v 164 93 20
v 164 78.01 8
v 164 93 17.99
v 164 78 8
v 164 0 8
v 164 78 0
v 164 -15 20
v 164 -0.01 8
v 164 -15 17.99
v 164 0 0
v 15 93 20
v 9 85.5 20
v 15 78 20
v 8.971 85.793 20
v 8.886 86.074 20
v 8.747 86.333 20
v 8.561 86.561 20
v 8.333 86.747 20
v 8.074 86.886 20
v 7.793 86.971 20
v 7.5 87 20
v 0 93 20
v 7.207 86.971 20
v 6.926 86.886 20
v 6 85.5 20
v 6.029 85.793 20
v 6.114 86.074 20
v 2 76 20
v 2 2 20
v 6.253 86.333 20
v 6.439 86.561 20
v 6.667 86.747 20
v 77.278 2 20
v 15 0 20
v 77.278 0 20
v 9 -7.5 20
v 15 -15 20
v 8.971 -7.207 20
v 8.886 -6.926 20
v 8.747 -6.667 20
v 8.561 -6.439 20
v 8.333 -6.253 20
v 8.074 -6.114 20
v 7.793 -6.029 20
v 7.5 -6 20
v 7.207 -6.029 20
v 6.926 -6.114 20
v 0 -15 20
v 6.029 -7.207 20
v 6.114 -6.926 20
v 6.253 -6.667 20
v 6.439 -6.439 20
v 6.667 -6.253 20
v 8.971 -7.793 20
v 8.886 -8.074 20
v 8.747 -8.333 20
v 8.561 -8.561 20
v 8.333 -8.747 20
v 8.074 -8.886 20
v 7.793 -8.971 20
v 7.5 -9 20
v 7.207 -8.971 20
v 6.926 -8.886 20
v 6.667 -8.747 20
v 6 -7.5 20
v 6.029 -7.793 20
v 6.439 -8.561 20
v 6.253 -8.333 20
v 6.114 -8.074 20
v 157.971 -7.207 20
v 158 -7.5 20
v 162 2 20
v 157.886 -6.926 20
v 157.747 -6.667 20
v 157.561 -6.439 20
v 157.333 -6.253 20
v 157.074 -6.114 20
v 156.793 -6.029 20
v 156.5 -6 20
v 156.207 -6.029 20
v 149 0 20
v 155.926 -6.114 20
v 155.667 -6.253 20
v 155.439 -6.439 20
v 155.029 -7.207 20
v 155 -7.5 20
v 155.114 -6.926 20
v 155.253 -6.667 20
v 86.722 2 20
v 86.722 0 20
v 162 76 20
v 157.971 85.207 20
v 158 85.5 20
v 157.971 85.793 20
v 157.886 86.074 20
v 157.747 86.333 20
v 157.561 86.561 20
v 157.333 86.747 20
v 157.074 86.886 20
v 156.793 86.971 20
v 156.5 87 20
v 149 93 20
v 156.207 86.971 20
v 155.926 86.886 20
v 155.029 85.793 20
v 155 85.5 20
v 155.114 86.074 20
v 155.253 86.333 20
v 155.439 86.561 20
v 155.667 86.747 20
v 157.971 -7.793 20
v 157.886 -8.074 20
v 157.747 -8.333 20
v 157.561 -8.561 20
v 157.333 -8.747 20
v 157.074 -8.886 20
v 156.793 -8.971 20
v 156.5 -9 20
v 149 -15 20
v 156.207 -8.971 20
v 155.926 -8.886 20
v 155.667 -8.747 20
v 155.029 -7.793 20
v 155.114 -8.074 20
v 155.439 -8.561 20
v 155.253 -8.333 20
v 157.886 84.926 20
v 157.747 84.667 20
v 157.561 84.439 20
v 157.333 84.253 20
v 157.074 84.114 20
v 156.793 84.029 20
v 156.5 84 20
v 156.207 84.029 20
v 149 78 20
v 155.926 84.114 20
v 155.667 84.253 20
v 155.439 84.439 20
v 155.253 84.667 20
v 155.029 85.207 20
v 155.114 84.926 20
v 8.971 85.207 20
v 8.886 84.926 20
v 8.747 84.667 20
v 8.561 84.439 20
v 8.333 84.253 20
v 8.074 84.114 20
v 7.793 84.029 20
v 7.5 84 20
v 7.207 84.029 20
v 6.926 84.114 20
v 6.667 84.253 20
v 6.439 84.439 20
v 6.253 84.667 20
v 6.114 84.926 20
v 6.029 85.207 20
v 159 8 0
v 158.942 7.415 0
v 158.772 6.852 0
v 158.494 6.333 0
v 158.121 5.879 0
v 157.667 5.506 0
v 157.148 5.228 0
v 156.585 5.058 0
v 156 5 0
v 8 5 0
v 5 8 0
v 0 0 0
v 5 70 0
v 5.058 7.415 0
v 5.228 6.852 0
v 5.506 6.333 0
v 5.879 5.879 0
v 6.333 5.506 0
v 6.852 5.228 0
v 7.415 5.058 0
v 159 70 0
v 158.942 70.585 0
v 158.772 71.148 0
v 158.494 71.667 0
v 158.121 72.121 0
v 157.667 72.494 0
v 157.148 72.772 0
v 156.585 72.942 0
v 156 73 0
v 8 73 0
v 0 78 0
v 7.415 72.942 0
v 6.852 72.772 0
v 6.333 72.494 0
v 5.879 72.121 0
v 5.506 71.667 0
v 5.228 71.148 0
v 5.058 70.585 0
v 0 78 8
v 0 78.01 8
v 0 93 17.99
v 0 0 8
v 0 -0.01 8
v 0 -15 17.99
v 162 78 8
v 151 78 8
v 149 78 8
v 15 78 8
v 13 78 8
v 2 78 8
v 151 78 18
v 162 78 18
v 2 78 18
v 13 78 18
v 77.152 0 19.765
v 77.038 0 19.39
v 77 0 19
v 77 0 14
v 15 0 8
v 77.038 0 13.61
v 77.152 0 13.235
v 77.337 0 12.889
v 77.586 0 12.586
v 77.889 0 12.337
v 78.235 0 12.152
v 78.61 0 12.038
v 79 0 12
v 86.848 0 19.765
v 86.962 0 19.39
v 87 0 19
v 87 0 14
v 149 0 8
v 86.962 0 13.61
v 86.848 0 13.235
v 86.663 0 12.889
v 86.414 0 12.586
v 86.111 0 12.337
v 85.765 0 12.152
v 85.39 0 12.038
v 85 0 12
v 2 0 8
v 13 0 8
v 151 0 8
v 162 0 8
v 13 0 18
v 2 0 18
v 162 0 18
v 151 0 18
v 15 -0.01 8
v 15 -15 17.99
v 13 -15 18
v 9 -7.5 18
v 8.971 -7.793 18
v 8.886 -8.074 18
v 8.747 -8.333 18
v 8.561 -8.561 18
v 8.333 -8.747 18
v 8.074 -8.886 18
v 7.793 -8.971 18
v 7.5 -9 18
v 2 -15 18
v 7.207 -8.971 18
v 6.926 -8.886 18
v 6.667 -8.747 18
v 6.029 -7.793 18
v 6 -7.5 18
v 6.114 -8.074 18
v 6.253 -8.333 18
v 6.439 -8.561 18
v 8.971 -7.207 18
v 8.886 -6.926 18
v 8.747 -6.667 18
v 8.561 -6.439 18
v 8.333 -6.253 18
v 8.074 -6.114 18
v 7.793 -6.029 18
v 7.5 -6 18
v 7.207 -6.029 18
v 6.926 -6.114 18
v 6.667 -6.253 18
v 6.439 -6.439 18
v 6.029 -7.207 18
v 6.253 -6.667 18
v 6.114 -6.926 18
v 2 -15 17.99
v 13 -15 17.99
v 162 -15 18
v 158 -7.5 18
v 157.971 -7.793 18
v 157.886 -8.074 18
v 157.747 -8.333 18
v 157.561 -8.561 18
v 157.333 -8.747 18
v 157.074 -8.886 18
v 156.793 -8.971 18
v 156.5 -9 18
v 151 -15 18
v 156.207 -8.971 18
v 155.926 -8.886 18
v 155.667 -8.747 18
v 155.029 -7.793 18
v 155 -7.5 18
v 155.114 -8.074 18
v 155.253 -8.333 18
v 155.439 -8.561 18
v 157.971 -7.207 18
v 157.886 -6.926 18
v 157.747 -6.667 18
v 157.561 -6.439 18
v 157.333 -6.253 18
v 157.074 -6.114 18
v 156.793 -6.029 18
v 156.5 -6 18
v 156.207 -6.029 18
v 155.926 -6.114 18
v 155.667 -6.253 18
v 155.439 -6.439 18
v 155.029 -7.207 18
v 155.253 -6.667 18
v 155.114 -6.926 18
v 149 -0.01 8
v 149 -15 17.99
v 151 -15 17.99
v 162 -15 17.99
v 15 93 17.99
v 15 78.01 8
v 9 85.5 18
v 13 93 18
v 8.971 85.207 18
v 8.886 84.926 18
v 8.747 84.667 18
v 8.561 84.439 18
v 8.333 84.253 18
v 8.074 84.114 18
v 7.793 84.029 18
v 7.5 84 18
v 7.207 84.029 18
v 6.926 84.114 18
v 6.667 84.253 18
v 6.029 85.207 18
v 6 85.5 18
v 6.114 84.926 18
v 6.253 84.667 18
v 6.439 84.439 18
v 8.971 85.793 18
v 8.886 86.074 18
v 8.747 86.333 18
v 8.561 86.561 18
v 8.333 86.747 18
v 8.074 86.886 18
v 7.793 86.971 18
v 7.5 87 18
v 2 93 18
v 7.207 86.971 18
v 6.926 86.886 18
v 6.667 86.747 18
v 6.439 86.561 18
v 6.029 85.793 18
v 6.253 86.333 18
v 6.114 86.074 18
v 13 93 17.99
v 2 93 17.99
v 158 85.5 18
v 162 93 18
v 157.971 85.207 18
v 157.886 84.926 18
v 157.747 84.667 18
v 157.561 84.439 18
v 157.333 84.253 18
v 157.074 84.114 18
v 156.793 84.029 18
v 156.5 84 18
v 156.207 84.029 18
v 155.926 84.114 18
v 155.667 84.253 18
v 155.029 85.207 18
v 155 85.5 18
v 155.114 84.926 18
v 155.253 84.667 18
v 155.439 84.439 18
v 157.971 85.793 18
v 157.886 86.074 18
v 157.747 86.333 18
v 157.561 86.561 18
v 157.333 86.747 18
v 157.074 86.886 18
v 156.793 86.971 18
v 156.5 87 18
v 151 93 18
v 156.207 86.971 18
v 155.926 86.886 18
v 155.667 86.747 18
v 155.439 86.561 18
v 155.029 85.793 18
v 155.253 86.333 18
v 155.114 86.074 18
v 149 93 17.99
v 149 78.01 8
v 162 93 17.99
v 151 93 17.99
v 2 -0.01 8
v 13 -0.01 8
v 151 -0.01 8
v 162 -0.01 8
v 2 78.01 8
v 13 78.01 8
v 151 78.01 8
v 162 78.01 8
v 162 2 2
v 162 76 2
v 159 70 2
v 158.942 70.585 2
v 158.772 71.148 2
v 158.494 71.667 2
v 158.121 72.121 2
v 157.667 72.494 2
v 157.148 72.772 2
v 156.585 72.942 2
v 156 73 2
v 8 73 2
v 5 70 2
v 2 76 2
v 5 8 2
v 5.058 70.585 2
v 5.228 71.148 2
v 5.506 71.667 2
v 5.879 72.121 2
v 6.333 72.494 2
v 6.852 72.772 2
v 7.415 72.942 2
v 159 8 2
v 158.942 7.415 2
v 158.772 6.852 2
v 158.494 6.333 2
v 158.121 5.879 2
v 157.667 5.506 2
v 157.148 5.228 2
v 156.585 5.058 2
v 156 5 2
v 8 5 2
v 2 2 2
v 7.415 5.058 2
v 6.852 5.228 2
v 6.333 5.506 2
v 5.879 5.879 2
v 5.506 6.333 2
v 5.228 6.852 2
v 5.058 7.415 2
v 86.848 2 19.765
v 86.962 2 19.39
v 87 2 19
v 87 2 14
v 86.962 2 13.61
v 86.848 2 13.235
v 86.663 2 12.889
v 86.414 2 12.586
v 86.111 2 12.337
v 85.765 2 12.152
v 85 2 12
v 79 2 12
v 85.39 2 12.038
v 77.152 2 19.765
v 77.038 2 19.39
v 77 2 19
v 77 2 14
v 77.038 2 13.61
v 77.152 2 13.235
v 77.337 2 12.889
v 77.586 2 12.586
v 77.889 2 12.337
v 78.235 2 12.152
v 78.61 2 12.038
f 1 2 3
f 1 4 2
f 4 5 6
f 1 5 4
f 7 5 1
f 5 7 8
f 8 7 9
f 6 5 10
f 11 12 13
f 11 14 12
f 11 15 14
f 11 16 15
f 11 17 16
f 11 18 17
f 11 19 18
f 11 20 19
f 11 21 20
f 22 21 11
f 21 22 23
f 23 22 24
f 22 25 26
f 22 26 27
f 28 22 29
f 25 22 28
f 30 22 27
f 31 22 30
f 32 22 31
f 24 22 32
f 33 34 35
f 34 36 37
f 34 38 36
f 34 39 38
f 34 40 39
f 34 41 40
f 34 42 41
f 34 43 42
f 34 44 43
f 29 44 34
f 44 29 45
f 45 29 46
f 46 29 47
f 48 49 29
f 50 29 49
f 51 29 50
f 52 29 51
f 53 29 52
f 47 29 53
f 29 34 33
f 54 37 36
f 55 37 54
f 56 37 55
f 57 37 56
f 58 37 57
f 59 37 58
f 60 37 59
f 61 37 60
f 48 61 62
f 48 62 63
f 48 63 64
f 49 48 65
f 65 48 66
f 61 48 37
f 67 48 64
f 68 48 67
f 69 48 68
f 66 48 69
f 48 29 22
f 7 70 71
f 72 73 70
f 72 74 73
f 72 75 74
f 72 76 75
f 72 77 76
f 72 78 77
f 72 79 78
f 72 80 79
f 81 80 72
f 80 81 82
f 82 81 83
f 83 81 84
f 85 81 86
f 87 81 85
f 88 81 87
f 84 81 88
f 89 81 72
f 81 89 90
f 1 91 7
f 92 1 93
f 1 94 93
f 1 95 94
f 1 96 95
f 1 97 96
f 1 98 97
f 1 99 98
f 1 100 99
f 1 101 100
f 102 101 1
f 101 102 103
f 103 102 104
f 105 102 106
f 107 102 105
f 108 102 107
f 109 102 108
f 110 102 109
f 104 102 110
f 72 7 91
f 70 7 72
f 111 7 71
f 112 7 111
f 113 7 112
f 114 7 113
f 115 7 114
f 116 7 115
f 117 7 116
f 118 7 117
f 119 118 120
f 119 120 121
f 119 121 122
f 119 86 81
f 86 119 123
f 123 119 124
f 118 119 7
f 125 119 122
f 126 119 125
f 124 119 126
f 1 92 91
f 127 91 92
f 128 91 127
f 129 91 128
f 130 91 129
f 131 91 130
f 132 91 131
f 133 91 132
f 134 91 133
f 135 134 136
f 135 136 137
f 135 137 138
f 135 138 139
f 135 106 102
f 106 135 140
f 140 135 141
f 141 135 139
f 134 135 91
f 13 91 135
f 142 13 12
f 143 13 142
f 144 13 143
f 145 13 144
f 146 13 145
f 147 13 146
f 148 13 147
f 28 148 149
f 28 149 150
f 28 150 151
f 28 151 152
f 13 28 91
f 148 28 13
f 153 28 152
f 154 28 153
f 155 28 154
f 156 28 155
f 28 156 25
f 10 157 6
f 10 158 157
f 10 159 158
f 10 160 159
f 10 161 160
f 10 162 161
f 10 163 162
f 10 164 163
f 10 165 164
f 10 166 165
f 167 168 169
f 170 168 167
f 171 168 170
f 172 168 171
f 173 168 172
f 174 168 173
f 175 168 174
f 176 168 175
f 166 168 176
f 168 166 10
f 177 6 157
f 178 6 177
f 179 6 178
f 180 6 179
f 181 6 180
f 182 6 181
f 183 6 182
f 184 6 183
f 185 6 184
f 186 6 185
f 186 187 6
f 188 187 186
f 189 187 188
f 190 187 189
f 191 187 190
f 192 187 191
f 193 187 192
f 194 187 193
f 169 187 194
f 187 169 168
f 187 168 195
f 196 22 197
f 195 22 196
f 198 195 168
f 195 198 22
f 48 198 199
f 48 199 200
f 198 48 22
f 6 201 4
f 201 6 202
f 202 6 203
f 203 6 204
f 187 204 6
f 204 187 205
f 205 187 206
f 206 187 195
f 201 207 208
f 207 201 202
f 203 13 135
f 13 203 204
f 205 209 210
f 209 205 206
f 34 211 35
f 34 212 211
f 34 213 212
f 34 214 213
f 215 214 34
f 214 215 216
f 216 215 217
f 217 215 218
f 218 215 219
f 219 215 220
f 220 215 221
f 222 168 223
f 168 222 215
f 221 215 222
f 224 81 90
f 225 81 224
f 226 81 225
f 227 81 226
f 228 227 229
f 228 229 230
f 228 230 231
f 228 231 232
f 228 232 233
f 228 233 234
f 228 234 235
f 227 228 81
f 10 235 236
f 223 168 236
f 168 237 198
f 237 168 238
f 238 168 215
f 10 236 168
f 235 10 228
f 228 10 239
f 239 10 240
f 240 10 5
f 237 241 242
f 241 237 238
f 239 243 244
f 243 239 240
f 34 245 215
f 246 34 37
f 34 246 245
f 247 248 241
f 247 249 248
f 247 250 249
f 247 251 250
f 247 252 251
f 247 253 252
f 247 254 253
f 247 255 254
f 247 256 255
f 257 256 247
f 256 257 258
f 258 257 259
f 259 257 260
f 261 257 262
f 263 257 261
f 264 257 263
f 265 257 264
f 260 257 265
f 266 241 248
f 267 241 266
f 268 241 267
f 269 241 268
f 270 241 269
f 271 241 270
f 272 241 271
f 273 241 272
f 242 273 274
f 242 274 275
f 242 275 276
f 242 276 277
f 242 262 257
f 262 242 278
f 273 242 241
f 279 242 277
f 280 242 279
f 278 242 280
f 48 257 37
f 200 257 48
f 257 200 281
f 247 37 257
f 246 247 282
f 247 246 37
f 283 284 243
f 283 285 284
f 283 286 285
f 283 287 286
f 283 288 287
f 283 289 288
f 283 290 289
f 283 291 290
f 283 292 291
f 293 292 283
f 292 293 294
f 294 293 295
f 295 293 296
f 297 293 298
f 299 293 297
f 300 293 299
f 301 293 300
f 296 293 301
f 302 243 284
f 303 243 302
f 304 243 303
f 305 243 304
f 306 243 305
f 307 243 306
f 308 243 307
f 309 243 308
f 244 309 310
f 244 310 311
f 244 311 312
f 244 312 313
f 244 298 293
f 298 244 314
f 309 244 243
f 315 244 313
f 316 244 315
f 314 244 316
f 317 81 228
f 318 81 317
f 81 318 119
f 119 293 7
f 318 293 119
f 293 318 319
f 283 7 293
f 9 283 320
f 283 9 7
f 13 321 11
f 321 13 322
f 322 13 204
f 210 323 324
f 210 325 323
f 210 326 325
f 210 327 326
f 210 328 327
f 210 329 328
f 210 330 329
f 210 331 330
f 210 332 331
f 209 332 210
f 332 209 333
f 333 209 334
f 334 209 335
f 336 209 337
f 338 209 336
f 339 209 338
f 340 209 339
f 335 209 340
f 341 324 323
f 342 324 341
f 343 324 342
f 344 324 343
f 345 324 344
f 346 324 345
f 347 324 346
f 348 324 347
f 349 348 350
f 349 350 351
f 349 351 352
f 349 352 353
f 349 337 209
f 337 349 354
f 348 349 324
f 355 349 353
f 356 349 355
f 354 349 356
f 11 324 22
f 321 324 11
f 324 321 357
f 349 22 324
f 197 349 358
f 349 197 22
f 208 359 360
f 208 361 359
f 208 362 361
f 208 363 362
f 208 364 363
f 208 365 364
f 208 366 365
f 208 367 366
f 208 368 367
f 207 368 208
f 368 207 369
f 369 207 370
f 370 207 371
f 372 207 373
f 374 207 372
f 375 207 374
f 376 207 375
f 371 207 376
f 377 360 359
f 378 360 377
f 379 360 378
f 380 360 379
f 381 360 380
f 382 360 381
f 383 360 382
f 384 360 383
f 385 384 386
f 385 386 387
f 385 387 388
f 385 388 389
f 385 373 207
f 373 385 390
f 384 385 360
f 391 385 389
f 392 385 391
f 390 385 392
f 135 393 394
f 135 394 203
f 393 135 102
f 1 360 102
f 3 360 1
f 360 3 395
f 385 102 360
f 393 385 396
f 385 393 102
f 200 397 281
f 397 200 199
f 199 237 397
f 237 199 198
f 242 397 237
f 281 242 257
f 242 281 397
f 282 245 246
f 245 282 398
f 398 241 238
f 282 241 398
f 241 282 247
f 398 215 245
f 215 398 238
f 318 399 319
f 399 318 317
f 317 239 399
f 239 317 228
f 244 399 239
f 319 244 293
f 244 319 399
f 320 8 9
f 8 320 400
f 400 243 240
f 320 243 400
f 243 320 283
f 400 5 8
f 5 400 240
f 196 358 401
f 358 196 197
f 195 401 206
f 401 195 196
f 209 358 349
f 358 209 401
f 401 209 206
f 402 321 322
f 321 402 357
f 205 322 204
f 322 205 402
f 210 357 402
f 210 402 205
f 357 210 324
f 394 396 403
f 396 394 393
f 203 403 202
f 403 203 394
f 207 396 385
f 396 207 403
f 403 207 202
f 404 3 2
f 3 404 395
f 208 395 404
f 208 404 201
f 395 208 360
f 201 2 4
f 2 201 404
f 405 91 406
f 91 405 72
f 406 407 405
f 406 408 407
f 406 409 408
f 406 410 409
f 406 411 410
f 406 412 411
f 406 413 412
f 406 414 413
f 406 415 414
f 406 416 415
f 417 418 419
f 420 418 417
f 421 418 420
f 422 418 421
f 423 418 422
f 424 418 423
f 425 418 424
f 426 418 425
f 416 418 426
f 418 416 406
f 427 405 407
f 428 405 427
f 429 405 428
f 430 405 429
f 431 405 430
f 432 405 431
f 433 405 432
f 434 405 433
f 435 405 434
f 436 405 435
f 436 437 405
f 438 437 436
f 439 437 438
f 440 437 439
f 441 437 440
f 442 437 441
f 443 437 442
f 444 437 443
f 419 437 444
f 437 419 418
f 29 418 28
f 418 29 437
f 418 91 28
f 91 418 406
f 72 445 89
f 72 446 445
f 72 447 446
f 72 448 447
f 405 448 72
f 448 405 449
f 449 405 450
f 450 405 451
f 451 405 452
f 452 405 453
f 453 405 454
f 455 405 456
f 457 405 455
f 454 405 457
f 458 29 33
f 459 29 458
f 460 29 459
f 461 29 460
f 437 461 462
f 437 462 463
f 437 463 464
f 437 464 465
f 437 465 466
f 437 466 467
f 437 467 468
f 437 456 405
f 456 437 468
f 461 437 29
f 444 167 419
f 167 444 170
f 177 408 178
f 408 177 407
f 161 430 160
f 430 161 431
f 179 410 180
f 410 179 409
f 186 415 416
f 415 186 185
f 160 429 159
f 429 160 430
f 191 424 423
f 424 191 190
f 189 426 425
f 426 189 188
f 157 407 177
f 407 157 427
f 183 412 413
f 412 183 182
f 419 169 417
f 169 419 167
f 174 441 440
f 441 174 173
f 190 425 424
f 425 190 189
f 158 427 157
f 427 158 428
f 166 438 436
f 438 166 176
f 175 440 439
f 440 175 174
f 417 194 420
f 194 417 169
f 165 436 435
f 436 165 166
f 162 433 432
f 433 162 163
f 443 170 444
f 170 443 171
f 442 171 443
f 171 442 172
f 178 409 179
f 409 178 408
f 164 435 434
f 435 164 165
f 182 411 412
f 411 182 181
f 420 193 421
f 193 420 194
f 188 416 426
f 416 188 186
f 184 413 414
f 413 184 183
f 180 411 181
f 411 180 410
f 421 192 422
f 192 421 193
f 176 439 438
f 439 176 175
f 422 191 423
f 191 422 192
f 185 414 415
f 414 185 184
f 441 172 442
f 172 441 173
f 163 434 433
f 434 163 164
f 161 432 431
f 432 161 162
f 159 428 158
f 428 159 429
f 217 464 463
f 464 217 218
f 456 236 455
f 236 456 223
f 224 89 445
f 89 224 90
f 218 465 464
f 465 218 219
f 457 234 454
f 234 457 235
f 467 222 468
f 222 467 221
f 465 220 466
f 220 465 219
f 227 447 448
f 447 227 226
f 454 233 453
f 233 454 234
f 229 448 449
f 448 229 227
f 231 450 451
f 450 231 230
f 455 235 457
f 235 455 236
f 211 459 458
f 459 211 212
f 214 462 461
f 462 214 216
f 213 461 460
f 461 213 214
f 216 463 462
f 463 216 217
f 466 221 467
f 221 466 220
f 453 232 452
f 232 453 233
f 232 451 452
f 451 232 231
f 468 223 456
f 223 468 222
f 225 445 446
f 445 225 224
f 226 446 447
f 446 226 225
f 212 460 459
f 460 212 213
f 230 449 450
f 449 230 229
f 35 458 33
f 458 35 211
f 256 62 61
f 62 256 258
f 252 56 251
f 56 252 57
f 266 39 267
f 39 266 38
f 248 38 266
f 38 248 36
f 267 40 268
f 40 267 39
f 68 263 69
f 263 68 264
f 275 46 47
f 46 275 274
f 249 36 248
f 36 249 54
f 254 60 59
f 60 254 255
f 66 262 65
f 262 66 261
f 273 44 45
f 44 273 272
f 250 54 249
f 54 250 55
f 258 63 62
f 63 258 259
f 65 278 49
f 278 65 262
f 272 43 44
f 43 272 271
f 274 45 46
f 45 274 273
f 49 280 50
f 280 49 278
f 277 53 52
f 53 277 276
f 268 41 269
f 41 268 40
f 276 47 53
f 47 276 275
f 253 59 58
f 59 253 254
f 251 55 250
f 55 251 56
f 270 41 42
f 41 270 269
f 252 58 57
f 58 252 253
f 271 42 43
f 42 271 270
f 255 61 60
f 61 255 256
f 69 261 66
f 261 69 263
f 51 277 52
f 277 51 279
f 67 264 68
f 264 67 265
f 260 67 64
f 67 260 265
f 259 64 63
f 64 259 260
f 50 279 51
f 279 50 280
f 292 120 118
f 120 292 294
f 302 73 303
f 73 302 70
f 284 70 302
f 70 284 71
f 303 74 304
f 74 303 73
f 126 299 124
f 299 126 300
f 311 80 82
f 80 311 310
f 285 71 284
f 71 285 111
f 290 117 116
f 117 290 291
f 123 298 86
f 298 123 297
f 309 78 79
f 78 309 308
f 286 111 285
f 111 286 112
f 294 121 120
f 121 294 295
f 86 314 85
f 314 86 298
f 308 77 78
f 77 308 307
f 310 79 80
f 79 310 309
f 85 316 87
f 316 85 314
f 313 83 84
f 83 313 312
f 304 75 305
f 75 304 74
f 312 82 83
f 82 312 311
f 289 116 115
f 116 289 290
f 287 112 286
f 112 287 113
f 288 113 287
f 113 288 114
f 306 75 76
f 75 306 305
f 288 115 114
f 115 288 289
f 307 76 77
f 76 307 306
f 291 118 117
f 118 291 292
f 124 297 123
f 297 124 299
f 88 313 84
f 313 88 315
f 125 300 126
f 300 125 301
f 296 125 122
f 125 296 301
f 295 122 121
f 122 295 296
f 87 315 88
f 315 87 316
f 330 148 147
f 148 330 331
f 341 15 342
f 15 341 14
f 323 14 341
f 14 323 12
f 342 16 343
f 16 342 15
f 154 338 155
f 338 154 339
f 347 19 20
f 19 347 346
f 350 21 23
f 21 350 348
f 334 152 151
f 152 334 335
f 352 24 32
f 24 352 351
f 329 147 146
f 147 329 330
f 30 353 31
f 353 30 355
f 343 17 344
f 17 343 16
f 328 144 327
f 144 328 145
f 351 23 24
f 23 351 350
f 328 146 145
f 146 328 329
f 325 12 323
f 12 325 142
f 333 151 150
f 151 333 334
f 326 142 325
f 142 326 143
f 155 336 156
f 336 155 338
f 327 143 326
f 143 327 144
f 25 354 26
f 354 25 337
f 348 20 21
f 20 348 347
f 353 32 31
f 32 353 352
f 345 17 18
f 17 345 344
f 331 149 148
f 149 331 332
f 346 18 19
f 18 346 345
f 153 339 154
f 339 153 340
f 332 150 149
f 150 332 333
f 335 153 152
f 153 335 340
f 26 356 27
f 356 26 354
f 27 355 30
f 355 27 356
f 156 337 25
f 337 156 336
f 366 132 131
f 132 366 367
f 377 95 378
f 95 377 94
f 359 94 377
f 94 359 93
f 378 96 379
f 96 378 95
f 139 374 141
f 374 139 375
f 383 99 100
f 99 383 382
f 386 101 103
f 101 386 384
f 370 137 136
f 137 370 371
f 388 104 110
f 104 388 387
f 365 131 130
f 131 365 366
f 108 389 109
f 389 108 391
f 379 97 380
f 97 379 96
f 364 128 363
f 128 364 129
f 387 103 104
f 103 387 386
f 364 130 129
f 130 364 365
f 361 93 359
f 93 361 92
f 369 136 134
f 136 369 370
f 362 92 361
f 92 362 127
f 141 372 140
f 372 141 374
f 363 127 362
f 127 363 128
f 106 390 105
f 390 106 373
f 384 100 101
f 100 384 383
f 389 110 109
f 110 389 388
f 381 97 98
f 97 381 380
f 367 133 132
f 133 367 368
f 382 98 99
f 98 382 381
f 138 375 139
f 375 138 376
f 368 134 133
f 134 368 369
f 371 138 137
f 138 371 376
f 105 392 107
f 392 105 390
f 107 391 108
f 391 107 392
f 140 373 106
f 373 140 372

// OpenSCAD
// Box enclosure for 160x74x18mm object

// Inner dimensions (the object to enclose)
inner_length = 160;
inner_width = 74;
inner_height = 18;

// Wall thickness
wall = 2;

// Bottom hole inset from inner walls
hole_inset = 3;

// Bottom hole corner radius
hole_corner_radius = 3;

// Side hole dimensions
side_hole_width = 10;
side_hole_height = 8;
side_hole_corner_radius = 2;

// Overhang dimensions
overhang_width = 15;
overhang_length = 15;

// Screw hole diameter
screw_hole_d = 3;

// Gusset dimensions
gusset_thickness = 2;
gusset_height = 10;

// Outer dimensions
outer_length = inner_length + 2 * wall;
outer_width = inner_width + 2 * wall;
outer_height = inner_height + wall; // wall on bottom only, open top

// Bottom hole dimensions
hole_length = inner_length - 2 * hole_inset;
hole_width = inner_width - 2 * hole_inset;

// Overhang positions along X (flush to edges)
overhang_x1 = 0;
overhang_x2 = outer_length - overhang_width;

// Rounded rectangle module
module rounded_rect(length, width, height, radius) {
    translate([radius, radius, 0])
        hull() {
            cylinder(h = height, r = radius, $fn = 32);
            translate([length - 2 * radius, 0, 0])
                cylinder(h = height, r = radius, $fn = 32);
            translate([0, width - 2 * radius, 0])
                cylinder(h = height, r = radius, $fn = 32);
            translate([length - 2 * radius, width - 2 * radius, 0])
                cylinder(h = height, r = radius, $fn = 32);
        }
}

// Gusset module: right-triangle brace
module gusset(length, height, thickness) {
    hull() {
        cube([thickness, 0.01, height]);
        translate([0, length - 0.01, height - 0.01])
            cube([thickness, 0.01, 0.01]);
    }
}

difference() {
    union() {
        // Outer shell
        cube([outer_length, outer_width, outer_height]);

        // Left side overhangs (Y=0, extending in -Y)
        translate([overhang_x1, -overhang_length, outer_height - wall])
            cube([overhang_width, overhang_length, wall]);
        translate([overhang_x2, -overhang_length, outer_height - wall])
            cube([overhang_width, overhang_length, wall]);

        // Right side overhangs (Y=outer_width, extending in +Y)
        translate([overhang_x1, outer_width, outer_height - wall])
            cube([overhang_width, overhang_length, wall]);
        translate([overhang_x2, outer_width, outer_height - wall])
            cube([overhang_width, overhang_length, wall]);

        // Gussets - left side, front overhang
        translate([overhang_x1, 0, outer_height - wall - gusset_height])
            mirror([0, 1, 0])
                gusset(overhang_length, gusset_height, gusset_thickness);
        translate([overhang_x1 + overhang_width - gusset_thickness, 0, outer_height - wall - gusset_height])
            mirror([0, 1, 0])
                gusset(overhang_length, gusset_height, gusset_thickness);

        // Gussets - left side, rear overhang
        translate([overhang_x2, 0, outer_height - wall - gusset_height])
            mirror([0, 1, 0])
                gusset(overhang_length, gusset_height, gusset_thickness);
        translate([overhang_x2 + overhang_width - gusset_thickness, 0, outer_height - wall - gusset_height])
            mirror([0, 1, 0])
                gusset(overhang_length, gusset_height, gusset_thickness);

        // Gussets - right side, front overhang
        translate([overhang_x1, outer_width, outer_height - wall - gusset_height])
            gusset(overhang_length, gusset_height, gusset_thickness);
        translate([overhang_x1 + overhang_width - gusset_thickness, outer_width, outer_height - wall - gusset_height])
            gusset(overhang_length, gusset_height, gusset_thickness);

        // Gussets - right side, rear overhang
        translate([overhang_x2, outer_width, outer_height - wall - gusset_height])
            gusset(overhang_length, gusset_height, gusset_thickness);
        translate([overhang_x2 + overhang_width - gusset_thickness, outer_width, outer_height - wall - gusset_height])
            gusset(overhang_length, gusset_height, gusset_thickness);
    }

    // Inner cavity
    translate([wall, wall, wall])
        cube([inner_length, inner_width, inner_height + 1]);

    // Rounded square hole in the bottom
    translate([wall + hole_inset, wall + hole_inset, -1])
        rounded_rect(hole_length, hole_width, wall + 2, hole_corner_radius);

    // Rounded hole on the long side (front), centered horizontally, near top edge
    translate([outer_length / 2 - side_hole_width / 2, -1, outer_height - side_hole_height])
        rotate([-90, 0, 0])
            translate([0, -(side_hole_height + 1), 0])
                rounded_rect(side_hole_width, side_hole_height + 1, wall + 2, side_hole_corner_radius);

    // Screw holes in overhangs - left side
    translate([overhang_x1 + overhang_width / 2, -overhang_length / 2, outer_height - wall - 1])
        cylinder(h = wall + 2, d = screw_hole_d, $fn = 32);
    translate([overhang_x2 + overhang_width / 2, -overhang_length / 2, outer_height - wall - 1])
        cylinder(h = wall + 2, d = screw_hole_d, $fn = 32);

    // Screw holes in overhangs - right side
    translate([overhang_x1 + overhang_width / 2, outer_width + overhang_length / 2, outer_height - wall - 1])
        cylinder(h = wall + 2, d = screw_hole_d, $fn = 32);
    translate([overhang_x2 + overhang_width / 2, outer_width + overhang_length / 2, outer_height - wall - 1])
        cylinder(h = wall + 2, d = screw_hole_d, $fn = 32);
}
